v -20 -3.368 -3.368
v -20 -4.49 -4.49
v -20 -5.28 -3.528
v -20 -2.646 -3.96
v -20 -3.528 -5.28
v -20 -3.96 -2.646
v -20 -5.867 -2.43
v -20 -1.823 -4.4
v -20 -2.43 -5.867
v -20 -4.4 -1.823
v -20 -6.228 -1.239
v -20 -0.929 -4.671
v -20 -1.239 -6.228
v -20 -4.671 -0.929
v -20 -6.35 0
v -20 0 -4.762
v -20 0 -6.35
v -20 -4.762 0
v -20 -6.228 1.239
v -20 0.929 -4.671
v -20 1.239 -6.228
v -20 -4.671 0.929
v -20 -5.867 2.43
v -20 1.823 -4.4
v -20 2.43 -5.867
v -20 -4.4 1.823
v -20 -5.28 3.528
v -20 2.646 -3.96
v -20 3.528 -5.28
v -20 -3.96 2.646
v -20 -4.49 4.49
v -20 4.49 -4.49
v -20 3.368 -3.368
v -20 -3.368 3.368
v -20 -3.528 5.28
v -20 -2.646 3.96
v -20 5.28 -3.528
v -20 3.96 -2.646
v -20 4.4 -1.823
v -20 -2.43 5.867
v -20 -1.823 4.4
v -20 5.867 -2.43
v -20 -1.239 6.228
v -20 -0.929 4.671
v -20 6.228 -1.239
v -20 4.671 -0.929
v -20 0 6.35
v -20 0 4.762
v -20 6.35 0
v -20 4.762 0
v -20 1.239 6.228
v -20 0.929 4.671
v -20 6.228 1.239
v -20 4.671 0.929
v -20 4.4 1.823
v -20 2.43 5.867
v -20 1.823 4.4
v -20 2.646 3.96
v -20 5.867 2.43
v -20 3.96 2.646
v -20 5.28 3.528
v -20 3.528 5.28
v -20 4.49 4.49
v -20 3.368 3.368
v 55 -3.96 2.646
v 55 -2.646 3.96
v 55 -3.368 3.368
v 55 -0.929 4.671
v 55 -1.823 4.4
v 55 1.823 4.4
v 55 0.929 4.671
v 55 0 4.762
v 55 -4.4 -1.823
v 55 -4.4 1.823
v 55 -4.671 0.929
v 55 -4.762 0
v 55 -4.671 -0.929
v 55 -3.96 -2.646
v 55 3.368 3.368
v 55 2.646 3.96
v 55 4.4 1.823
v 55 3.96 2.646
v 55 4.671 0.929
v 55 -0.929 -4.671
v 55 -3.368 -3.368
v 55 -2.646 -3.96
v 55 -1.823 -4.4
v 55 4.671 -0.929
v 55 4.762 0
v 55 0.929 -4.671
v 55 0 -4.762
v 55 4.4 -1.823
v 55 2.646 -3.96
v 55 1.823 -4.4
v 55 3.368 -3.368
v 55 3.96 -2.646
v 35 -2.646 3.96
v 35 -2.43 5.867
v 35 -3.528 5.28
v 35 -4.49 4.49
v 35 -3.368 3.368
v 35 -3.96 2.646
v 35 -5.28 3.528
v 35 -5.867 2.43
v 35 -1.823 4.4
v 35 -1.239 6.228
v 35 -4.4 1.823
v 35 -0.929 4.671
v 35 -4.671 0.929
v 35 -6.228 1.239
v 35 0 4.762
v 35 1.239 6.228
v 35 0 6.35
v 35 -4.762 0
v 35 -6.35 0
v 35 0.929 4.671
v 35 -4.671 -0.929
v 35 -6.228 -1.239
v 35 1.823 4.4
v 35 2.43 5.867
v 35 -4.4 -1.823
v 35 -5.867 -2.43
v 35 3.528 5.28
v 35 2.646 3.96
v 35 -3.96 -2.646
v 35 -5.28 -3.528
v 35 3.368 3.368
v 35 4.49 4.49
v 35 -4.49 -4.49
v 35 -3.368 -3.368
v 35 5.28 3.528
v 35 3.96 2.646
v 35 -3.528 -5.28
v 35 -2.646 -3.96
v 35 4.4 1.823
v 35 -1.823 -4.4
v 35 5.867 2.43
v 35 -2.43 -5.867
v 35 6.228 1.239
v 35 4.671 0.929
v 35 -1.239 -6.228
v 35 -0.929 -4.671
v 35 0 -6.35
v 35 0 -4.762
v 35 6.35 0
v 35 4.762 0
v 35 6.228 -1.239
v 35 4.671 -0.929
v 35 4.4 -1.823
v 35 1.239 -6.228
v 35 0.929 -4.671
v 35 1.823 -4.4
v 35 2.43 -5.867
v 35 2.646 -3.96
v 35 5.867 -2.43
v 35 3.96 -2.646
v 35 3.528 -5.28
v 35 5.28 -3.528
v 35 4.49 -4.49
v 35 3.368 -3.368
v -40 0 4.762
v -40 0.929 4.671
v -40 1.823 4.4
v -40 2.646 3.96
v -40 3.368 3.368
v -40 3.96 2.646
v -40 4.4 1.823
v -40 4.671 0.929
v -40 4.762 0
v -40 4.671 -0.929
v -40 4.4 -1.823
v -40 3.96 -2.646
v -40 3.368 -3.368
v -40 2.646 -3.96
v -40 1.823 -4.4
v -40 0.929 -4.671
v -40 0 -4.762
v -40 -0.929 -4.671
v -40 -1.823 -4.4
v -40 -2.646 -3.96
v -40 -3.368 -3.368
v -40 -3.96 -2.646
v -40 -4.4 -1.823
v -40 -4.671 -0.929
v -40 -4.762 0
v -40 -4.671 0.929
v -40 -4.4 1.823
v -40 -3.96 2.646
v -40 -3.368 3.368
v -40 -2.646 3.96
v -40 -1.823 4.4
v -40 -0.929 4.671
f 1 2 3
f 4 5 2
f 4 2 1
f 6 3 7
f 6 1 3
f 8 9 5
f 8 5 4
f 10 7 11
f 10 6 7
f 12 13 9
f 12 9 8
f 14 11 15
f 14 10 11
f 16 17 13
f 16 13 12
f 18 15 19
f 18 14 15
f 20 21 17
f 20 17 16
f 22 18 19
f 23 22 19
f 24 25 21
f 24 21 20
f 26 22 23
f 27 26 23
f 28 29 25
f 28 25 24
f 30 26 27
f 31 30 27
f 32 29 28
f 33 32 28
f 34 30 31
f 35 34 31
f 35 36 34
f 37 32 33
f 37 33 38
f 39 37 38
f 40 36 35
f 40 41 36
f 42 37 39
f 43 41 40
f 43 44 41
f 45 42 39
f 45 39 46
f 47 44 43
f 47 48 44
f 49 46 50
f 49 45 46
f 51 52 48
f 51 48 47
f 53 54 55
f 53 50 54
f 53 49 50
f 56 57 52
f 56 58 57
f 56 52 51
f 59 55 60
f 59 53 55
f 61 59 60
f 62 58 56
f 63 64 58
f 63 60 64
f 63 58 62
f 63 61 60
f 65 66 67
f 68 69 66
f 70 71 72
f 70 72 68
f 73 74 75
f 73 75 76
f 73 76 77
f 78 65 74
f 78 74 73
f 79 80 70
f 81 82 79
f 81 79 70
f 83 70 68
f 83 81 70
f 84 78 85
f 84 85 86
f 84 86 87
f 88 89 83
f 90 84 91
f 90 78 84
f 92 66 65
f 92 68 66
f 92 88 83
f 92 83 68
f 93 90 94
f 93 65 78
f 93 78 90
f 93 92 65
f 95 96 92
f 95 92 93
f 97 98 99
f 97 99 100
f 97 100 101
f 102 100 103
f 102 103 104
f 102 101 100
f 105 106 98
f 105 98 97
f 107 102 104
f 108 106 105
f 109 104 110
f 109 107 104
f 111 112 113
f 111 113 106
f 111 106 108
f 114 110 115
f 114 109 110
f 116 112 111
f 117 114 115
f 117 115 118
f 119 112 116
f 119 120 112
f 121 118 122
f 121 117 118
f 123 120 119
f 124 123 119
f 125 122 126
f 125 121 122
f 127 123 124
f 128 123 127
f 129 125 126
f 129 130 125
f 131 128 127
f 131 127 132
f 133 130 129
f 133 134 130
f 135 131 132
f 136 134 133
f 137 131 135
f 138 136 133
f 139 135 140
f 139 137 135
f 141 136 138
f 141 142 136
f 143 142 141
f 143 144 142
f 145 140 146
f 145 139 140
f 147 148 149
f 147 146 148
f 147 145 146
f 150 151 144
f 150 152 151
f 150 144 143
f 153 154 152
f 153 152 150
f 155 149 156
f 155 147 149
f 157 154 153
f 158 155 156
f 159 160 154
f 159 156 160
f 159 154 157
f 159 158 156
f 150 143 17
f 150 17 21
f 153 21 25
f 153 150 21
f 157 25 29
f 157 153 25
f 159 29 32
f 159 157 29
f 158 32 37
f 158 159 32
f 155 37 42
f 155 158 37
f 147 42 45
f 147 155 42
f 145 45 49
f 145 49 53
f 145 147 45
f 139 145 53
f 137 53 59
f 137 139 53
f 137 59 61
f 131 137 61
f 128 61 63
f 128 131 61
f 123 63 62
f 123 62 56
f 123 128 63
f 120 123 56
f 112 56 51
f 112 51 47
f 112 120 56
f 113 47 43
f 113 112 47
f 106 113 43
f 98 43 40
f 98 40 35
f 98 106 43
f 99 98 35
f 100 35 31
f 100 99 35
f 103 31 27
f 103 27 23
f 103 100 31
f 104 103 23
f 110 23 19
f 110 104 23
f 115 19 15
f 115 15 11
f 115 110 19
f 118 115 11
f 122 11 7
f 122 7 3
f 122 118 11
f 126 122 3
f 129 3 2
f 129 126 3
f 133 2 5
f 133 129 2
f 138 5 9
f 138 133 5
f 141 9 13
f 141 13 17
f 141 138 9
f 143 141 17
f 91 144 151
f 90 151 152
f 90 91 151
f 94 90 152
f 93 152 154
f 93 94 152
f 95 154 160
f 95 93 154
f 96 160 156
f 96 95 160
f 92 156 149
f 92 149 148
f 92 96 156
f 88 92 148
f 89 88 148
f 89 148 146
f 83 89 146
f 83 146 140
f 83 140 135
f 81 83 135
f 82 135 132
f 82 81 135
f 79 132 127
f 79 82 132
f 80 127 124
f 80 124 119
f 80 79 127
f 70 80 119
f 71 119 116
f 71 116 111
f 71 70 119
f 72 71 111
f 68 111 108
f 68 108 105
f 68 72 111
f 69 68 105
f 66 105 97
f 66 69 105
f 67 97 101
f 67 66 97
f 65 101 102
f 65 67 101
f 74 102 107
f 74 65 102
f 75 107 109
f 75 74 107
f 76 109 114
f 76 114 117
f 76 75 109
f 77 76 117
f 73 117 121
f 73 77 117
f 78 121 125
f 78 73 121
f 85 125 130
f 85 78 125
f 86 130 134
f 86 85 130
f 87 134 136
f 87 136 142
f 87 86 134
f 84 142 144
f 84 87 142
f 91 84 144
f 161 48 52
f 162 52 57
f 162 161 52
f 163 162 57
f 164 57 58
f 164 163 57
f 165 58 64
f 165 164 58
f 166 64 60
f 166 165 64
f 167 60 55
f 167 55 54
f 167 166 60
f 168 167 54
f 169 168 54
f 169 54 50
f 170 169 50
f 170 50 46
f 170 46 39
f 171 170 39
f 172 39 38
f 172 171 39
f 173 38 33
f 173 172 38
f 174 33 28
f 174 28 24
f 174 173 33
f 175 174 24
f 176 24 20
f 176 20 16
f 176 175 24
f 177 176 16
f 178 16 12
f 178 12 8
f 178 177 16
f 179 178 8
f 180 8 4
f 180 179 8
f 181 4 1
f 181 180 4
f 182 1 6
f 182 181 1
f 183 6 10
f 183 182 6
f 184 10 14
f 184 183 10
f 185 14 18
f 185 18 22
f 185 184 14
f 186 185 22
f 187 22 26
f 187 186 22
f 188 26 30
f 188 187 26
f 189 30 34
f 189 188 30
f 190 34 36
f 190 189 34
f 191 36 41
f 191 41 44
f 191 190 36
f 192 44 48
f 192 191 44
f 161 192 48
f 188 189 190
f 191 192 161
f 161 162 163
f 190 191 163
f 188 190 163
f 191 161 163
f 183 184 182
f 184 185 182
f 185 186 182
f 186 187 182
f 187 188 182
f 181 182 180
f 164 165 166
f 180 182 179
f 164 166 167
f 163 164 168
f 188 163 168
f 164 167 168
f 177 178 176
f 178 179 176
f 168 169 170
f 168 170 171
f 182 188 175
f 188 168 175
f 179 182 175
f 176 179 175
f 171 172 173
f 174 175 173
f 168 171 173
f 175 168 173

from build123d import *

# Parameters (mm, degrees)
SKETCH1_R                = 6.35
BOSS_EXTRUDE1_DEPTH      = 55
BOSS_EXTRUDE1_DEPTH_BACK = 40
SKETCH2_OUTSIDE_W        = 34.036
SKETCH2_OUTSIDE_H        = 34.036
SKETCH2_OUTSIDE_R        = 4.7625
CUT_EXTRUDE1_DEPTH       = 20
SKETCH3_OUTSIDE_W        = 34.036
SKETCH3_OUTSIDE_H        = 34.036
SKETCH3_OUTSIDE_R        = 4.7625
CUT_EXTRUDE2_DEPTH       = 20


with BuildPart() as part:
    # Sketch1 → Boss-Extrude1 (new body, two sides)
    with BuildSketch(Plane(origin=(0, 0, 0), x_dir=(0, 0, -1), z_dir=(1, 0, 0))) as boss_extrude1_sk:
        Circle(SKETCH1_R)
    extrude(amount=BOSS_EXTRUDE1_DEPTH)
    extrude(boss_extrude1_sk.sketch, amount=-BOSS_EXTRUDE1_DEPTH_BACK)

    # Sketch2 outside → Cut-Extrude1 (cut)
    with BuildSketch(Plane.ZY.offset(40)):
        Rectangle(SKETCH2_OUTSIDE_W, SKETCH2_OUTSIDE_H)
        Circle(SKETCH2_OUTSIDE_R, mode=Mode.SUBTRACT)
    extrude(amount=-CUT_EXTRUDE1_DEPTH, mode=Mode.SUBTRACT)

    # Sketch3 outside → Cut-Extrude2 (cut)
    with BuildSketch(Plane(origin=(55, 0, 0), x_dir=(0, 0, -1), z_dir=(1, 0, 0))):
        Rectangle(SKETCH3_OUTSIDE_W, SKETCH3_OUTSIDE_H)
        Circle(SKETCH3_OUTSIDE_R, mode=Mode.SUBTRACT)
    extrude(amount=-CUT_EXTRUDE2_DEPTH, mode=Mode.SUBTRACT)


solid = part.part
